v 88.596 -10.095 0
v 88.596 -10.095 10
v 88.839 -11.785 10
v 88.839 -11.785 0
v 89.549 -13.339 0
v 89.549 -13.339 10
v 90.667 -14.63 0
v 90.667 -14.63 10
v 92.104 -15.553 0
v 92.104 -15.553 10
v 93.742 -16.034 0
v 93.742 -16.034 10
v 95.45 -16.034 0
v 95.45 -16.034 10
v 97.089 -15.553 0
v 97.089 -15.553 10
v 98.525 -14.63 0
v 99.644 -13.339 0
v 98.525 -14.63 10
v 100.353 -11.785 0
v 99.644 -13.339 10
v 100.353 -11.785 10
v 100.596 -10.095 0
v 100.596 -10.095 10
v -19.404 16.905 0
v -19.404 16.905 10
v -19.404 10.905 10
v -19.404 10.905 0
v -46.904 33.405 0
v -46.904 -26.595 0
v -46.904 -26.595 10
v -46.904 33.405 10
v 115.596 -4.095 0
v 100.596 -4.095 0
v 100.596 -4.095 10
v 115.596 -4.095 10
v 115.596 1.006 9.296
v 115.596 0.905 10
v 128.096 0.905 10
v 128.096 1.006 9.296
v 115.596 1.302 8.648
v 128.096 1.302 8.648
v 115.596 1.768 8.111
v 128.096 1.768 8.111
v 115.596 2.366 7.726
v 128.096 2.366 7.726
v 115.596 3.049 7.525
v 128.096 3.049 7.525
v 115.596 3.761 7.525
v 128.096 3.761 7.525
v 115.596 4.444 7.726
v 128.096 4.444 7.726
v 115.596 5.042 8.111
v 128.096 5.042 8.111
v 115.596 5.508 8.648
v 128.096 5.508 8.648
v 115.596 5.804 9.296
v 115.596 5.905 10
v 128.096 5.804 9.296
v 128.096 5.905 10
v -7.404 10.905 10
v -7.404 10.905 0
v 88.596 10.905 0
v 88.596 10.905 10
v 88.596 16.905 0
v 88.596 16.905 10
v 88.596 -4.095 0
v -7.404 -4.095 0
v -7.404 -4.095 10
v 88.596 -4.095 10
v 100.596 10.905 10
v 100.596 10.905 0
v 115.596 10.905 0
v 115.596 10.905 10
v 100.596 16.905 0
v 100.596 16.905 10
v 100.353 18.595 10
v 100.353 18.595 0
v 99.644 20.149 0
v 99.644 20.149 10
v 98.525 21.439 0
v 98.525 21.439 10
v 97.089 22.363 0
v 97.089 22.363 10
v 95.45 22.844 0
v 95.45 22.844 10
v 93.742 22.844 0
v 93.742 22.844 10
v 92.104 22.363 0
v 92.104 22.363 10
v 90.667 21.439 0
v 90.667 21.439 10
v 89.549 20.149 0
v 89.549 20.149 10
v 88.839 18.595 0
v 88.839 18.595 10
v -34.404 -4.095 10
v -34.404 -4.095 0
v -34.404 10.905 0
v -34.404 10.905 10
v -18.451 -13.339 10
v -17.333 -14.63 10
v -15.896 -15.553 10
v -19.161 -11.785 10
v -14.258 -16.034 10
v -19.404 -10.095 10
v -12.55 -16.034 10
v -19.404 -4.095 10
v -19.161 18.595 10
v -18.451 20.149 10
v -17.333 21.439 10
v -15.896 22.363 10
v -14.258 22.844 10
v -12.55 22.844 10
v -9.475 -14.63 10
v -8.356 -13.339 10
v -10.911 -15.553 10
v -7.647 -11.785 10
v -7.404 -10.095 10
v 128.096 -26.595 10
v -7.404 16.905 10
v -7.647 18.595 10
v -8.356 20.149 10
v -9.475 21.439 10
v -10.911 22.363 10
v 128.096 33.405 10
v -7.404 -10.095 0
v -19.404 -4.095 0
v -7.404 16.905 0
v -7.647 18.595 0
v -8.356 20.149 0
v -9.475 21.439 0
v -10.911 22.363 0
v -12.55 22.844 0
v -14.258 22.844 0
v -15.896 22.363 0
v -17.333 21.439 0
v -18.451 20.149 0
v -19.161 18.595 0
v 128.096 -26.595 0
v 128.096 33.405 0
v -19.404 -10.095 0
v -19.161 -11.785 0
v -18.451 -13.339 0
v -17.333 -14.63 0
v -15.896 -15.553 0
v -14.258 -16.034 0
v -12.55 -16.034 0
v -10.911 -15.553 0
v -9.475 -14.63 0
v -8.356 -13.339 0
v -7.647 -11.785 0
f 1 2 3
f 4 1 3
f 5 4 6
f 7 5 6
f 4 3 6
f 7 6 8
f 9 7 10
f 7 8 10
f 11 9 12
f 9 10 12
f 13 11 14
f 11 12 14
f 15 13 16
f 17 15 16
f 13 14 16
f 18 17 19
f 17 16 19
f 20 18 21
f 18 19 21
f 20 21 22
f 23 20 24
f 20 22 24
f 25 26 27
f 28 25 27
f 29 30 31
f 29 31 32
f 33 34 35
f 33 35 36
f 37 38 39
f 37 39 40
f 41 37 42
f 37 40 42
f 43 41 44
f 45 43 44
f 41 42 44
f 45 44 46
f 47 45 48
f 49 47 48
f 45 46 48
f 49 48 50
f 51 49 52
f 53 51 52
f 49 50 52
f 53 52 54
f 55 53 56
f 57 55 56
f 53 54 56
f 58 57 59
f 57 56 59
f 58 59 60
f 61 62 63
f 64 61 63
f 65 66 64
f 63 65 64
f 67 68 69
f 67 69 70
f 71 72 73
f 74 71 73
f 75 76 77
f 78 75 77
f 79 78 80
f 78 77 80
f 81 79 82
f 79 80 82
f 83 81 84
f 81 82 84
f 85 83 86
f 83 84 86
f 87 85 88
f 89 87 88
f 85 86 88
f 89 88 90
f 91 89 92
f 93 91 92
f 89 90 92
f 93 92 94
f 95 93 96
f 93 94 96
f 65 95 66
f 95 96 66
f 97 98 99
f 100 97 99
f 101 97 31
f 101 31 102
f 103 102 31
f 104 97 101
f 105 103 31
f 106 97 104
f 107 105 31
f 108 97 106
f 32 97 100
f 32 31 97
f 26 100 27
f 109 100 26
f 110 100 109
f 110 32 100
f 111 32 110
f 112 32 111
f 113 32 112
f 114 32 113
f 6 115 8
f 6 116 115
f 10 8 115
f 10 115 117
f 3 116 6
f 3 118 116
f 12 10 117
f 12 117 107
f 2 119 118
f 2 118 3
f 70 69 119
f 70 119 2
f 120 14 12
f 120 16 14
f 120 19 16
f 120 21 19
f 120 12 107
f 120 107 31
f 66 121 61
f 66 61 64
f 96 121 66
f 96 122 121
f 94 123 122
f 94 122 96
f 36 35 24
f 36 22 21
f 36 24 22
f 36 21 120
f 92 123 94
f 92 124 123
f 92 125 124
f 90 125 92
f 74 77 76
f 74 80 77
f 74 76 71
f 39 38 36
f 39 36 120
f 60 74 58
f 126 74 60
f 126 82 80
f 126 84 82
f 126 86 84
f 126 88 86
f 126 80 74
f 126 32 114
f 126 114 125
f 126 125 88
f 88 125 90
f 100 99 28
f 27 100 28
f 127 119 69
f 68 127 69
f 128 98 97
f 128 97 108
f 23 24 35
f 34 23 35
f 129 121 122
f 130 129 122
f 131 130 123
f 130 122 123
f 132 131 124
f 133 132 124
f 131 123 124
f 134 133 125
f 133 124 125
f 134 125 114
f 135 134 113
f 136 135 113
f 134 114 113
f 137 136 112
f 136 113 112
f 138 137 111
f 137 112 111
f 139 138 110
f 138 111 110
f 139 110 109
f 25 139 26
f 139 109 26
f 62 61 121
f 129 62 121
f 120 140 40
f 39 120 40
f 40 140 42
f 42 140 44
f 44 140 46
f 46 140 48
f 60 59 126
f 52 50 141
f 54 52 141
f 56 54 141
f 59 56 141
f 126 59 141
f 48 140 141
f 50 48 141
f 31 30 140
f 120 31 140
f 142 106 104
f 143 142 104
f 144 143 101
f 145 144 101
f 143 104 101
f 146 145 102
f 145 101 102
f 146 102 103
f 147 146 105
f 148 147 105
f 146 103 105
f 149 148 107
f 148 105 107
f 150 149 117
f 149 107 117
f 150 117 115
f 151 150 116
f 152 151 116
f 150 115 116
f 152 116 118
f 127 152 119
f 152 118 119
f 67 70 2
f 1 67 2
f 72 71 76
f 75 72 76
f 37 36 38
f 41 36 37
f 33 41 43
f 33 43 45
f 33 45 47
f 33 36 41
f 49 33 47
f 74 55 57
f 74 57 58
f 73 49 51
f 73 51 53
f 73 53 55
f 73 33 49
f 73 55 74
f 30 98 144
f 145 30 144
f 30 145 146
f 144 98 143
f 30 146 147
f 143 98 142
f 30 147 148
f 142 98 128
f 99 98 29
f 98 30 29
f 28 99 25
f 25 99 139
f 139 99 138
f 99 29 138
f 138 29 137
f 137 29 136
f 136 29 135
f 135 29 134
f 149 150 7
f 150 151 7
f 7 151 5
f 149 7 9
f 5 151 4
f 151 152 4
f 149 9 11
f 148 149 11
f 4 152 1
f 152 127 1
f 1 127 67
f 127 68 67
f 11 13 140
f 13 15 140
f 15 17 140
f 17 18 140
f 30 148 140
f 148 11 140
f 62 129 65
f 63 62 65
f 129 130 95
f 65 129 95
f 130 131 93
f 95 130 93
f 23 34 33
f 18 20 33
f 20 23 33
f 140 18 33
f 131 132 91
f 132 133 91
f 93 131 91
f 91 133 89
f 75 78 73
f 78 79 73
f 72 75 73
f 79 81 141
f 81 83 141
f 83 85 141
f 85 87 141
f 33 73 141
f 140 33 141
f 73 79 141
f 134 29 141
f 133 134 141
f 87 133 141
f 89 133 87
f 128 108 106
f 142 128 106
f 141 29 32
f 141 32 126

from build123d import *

# Parameters (mm, degrees)
F0_W     = 175
F0_H     = 60
F0_W_2   = 150
F0_H_2   = 15
F1_DEPTH = 10
F3_DEPTH = 25
F5_DEPTH = 25


with BuildPart() as f1:
    # F0 (on Top) → F1 (new body)
    with BuildSketch(Plane.XY):
        with Locations((40.5961677884, 3.4049740061)):
            Rectangle(F0_W, F0_H)
        with Locations((40.5961677884, 3.4049740061)):
            Rectangle(F0_W_2, F0_H_2, mode=Mode.SUBTRACT)
    extrude(amount=F1_DEPTH)

    # F2 (on face) → F3 (cut)
    with BuildSketch(Plane.YZ.offset(128.0961677884)):
        with BuildLine():
            ThreePointArc((0.9049740061, 10), (3.4049740061, 7.5), (5.9049740061, 10))
            Line((5.9049740061, 10), (0.9049740061, 10))
        make_face()
    extrude(amount=-F3_DEPTH, mode=Mode.SUBTRACT)

    # F4 (on face) → F5 (cut)
    with BuildSketch(Plane.XY.offset(10)):
        with BuildLine():
            Line((-7.4038322116, 16.9049740061), (-19.4038322116, 16.9049740061))
            ThreePointArc((-19.4038322116, 16.9049740061), (-17.6464728987, 12.662333319), (-13.4038322116, 10.9049740061))
            ThreePointArc((-13.4038322116, 10.9049740061), (-9.1611915245, 12.662333319), (-7.4038322116, 16.9049740061))
        make_face()
        Polygon((-13.4038322116, 10.9049740061), (-19.4038322116, 10.9049740061), (-19.4038322116, -4.0950259939), (-13.4038321289, -4.0950259939), (-7.4038322116, -4.0950259939), (-7.4038322116, 10.9049740061), align=None)
        with BuildLine():
            ThreePointArc((-7.4038322116, 16.9049740061), (-13.4038322116, 22.9049740061), (-19.4038322116, 16.9049740061))
            Line((-19.4038322116, 16.9049740061), (-7.4038322116, 16.9049740061))
        make_face()
        with BuildLine():
            Line((-7.4038322116, 10.9049740061), (-7.4038322116, 16.9049740061))
            ThreePointArc((-7.4038322116, 16.9049740061), (-9.1611915245, 12.662333319), (-13.4038322116, 10.9049740061))
            Line((-13.4038322116, 10.9049740061), (-7.4038322116, 10.9049740061))
        make_face()
        with BuildLine():
            ThreePointArc((-13.4038322116, 10.9049740061), (-17.6464728987, 12.662333319), (-19.4038322116, 16.9049740061))
            Line((-19.4038322116, 16.9049740061), (-19.4038322116, 10.9049740061))
            Line((-19.4038322116, 10.9049740061), (-13.4038322116, 10.9049740061))
        make_face()
        with BuildLine():
            ThreePointArc((-13.4038321289, -4.0950259939), (-17.6464728695, -5.8523852775), (-19.4038322116, -10.0950259939))
            Line((-19.4038322116, -10.0950259939), (-7.4038322116, -10.0950259939))
            ThreePointArc((-7.4038322116, -10.0950259939), (-9.1611914952, -5.852385336), (-13.4038321289, -4.0950259939))
        make_face()
        with BuildLine():
            Line((-13.4038321289, -4.0950259939), (-19.4038322116, -4.0950259939))
            Line((-19.4038322116, -4.0950259939), (-19.4038322116, -10.0950259939))
            ThreePointArc((-19.4038322116, -10.0950259939), (-17.6464728695, -5.8523852775), (-13.4038321289, -4.0950259939))
        make_face()
        with BuildLine():
            Line((-7.4038322116, -10.0950259939), (-7.4038322116, -4.0950259939))
            Line((-7.4038322116, -4.0950259939), (-13.4038321289, -4.0950259939))
            ThreePointArc((-13.4038321289, -4.0950259939), (-9.1611914952, -5.852385336), (-7.4038322116, -10.0950259939))
        make_face()
        with BuildLine():
            Line((-7.4038322116, -10.0950259939), (-19.4038322116, -10.0950259939))
            ThreePointArc((-19.4038322116, -10.0950259939), (-13.4038322116, -16.0950259939), (-7.4038322116, -10.0950259939))
        make_face()
        with BuildLine():
            Line((100.5961677884, -10.0950259939), (88.5961677884, -10.0950259939))
            ThreePointArc((88.5961677884, -10.0950259939), (94.5961677884, -16.0950259939), (100.5961677884, -10.0950259939))
        make_face()
        with BuildLine():
            ThreePointArc((94.5961677884, -4.0950259939), (90.3535271013, -5.8523853068), (88.5961677884, -10.0950259939))
            Line((88.5961677884, -10.0950259939), (100.5961677884, -10.0950259939))
            ThreePointArc((100.5961677884, -10.0950259939), (98.8388084755, -5.8523853068), (94.5961677884, -4.0950259939))
        make_face()
        Polygon((94.5961677884, 10.9049740061), (88.5961677884, 10.9049740061), (88.5961677884, -4.0950259939), (94.5961677884, -4.0950259939), (100.5961677884, -4.0950259939), (100.5961677884, 10.9049740061), align=None)
        with BuildLine():
            Line((100.5961677884, 16.9049740061), (88.5961677884, 16.9049740061))
            ThreePointArc((88.5961677884, 16.9049740061), (90.3535271013, 12.662333319), (94.5961677884, 10.9049740061))
            ThreePointArc((94.5961677884, 10.9049740061), (98.8388084755, 12.662333319), (100.5961677884, 16.9049740061))
        make_face()
        with BuildLine():
            ThreePointArc((100.5961677884, 16.9049740061), (94.5961677884, 22.9049740061), (88.5961677884, 16.9049740061))
            Line((88.5961677884, 16.9049740061), (100.5961677884, 16.9049740061))
        make_face()
        with BuildLine():
            ThreePointArc((100.5961677884, 16.9049740061), (98.8388084755, 12.662333319), (94.5961677884, 10.9049740061))
            Line((94.5961677884, 10.9049740061), (100.5961677884, 10.9049740061))
            Line((100.5961677884, 10.9049740061), (100.5961677884, 16.9049740061))
        make_face()
        with BuildLine():
            Line((88.5961677884, 16.9049740061), (88.5961677884, 10.9049740061))
            Line((88.5961677884, 10.9049740061), (94.5961677884, 10.9049740061))
            ThreePointArc((94.5961677884, 10.9049740061), (90.3535271013, 12.662333319), (88.5961677884, 16.9049740061))
        make_face()
        with BuildLine():
            Line((94.5961677884, -4.0950259939), (88.5961677884, -4.0950259939))
            Line((88.5961677884, -4.0950259939), (88.5961677884, -10.0950259939))
            ThreePointArc((88.5961677884, -10.0950259939), (90.3535271013, -5.8523853068), (94.5961677884, -4.0950259939))
        make_face()
        with BuildLine():
            Line((100.5961677884, -4.0950259939), (94.5961677884, -4.0950259939))
            ThreePointArc((94.5961677884, -4.0950259939), (98.8388084755, -5.8523853068), (100.5961677884, -10.0950259939))
            Line((100.5961677884, -10.0950259939), (100.5961677884, -4.0950259939))
        make_face()
    extrude(amount=-F5_DEPTH, mode=Mode.SUBTRACT)


solid = f1.part
